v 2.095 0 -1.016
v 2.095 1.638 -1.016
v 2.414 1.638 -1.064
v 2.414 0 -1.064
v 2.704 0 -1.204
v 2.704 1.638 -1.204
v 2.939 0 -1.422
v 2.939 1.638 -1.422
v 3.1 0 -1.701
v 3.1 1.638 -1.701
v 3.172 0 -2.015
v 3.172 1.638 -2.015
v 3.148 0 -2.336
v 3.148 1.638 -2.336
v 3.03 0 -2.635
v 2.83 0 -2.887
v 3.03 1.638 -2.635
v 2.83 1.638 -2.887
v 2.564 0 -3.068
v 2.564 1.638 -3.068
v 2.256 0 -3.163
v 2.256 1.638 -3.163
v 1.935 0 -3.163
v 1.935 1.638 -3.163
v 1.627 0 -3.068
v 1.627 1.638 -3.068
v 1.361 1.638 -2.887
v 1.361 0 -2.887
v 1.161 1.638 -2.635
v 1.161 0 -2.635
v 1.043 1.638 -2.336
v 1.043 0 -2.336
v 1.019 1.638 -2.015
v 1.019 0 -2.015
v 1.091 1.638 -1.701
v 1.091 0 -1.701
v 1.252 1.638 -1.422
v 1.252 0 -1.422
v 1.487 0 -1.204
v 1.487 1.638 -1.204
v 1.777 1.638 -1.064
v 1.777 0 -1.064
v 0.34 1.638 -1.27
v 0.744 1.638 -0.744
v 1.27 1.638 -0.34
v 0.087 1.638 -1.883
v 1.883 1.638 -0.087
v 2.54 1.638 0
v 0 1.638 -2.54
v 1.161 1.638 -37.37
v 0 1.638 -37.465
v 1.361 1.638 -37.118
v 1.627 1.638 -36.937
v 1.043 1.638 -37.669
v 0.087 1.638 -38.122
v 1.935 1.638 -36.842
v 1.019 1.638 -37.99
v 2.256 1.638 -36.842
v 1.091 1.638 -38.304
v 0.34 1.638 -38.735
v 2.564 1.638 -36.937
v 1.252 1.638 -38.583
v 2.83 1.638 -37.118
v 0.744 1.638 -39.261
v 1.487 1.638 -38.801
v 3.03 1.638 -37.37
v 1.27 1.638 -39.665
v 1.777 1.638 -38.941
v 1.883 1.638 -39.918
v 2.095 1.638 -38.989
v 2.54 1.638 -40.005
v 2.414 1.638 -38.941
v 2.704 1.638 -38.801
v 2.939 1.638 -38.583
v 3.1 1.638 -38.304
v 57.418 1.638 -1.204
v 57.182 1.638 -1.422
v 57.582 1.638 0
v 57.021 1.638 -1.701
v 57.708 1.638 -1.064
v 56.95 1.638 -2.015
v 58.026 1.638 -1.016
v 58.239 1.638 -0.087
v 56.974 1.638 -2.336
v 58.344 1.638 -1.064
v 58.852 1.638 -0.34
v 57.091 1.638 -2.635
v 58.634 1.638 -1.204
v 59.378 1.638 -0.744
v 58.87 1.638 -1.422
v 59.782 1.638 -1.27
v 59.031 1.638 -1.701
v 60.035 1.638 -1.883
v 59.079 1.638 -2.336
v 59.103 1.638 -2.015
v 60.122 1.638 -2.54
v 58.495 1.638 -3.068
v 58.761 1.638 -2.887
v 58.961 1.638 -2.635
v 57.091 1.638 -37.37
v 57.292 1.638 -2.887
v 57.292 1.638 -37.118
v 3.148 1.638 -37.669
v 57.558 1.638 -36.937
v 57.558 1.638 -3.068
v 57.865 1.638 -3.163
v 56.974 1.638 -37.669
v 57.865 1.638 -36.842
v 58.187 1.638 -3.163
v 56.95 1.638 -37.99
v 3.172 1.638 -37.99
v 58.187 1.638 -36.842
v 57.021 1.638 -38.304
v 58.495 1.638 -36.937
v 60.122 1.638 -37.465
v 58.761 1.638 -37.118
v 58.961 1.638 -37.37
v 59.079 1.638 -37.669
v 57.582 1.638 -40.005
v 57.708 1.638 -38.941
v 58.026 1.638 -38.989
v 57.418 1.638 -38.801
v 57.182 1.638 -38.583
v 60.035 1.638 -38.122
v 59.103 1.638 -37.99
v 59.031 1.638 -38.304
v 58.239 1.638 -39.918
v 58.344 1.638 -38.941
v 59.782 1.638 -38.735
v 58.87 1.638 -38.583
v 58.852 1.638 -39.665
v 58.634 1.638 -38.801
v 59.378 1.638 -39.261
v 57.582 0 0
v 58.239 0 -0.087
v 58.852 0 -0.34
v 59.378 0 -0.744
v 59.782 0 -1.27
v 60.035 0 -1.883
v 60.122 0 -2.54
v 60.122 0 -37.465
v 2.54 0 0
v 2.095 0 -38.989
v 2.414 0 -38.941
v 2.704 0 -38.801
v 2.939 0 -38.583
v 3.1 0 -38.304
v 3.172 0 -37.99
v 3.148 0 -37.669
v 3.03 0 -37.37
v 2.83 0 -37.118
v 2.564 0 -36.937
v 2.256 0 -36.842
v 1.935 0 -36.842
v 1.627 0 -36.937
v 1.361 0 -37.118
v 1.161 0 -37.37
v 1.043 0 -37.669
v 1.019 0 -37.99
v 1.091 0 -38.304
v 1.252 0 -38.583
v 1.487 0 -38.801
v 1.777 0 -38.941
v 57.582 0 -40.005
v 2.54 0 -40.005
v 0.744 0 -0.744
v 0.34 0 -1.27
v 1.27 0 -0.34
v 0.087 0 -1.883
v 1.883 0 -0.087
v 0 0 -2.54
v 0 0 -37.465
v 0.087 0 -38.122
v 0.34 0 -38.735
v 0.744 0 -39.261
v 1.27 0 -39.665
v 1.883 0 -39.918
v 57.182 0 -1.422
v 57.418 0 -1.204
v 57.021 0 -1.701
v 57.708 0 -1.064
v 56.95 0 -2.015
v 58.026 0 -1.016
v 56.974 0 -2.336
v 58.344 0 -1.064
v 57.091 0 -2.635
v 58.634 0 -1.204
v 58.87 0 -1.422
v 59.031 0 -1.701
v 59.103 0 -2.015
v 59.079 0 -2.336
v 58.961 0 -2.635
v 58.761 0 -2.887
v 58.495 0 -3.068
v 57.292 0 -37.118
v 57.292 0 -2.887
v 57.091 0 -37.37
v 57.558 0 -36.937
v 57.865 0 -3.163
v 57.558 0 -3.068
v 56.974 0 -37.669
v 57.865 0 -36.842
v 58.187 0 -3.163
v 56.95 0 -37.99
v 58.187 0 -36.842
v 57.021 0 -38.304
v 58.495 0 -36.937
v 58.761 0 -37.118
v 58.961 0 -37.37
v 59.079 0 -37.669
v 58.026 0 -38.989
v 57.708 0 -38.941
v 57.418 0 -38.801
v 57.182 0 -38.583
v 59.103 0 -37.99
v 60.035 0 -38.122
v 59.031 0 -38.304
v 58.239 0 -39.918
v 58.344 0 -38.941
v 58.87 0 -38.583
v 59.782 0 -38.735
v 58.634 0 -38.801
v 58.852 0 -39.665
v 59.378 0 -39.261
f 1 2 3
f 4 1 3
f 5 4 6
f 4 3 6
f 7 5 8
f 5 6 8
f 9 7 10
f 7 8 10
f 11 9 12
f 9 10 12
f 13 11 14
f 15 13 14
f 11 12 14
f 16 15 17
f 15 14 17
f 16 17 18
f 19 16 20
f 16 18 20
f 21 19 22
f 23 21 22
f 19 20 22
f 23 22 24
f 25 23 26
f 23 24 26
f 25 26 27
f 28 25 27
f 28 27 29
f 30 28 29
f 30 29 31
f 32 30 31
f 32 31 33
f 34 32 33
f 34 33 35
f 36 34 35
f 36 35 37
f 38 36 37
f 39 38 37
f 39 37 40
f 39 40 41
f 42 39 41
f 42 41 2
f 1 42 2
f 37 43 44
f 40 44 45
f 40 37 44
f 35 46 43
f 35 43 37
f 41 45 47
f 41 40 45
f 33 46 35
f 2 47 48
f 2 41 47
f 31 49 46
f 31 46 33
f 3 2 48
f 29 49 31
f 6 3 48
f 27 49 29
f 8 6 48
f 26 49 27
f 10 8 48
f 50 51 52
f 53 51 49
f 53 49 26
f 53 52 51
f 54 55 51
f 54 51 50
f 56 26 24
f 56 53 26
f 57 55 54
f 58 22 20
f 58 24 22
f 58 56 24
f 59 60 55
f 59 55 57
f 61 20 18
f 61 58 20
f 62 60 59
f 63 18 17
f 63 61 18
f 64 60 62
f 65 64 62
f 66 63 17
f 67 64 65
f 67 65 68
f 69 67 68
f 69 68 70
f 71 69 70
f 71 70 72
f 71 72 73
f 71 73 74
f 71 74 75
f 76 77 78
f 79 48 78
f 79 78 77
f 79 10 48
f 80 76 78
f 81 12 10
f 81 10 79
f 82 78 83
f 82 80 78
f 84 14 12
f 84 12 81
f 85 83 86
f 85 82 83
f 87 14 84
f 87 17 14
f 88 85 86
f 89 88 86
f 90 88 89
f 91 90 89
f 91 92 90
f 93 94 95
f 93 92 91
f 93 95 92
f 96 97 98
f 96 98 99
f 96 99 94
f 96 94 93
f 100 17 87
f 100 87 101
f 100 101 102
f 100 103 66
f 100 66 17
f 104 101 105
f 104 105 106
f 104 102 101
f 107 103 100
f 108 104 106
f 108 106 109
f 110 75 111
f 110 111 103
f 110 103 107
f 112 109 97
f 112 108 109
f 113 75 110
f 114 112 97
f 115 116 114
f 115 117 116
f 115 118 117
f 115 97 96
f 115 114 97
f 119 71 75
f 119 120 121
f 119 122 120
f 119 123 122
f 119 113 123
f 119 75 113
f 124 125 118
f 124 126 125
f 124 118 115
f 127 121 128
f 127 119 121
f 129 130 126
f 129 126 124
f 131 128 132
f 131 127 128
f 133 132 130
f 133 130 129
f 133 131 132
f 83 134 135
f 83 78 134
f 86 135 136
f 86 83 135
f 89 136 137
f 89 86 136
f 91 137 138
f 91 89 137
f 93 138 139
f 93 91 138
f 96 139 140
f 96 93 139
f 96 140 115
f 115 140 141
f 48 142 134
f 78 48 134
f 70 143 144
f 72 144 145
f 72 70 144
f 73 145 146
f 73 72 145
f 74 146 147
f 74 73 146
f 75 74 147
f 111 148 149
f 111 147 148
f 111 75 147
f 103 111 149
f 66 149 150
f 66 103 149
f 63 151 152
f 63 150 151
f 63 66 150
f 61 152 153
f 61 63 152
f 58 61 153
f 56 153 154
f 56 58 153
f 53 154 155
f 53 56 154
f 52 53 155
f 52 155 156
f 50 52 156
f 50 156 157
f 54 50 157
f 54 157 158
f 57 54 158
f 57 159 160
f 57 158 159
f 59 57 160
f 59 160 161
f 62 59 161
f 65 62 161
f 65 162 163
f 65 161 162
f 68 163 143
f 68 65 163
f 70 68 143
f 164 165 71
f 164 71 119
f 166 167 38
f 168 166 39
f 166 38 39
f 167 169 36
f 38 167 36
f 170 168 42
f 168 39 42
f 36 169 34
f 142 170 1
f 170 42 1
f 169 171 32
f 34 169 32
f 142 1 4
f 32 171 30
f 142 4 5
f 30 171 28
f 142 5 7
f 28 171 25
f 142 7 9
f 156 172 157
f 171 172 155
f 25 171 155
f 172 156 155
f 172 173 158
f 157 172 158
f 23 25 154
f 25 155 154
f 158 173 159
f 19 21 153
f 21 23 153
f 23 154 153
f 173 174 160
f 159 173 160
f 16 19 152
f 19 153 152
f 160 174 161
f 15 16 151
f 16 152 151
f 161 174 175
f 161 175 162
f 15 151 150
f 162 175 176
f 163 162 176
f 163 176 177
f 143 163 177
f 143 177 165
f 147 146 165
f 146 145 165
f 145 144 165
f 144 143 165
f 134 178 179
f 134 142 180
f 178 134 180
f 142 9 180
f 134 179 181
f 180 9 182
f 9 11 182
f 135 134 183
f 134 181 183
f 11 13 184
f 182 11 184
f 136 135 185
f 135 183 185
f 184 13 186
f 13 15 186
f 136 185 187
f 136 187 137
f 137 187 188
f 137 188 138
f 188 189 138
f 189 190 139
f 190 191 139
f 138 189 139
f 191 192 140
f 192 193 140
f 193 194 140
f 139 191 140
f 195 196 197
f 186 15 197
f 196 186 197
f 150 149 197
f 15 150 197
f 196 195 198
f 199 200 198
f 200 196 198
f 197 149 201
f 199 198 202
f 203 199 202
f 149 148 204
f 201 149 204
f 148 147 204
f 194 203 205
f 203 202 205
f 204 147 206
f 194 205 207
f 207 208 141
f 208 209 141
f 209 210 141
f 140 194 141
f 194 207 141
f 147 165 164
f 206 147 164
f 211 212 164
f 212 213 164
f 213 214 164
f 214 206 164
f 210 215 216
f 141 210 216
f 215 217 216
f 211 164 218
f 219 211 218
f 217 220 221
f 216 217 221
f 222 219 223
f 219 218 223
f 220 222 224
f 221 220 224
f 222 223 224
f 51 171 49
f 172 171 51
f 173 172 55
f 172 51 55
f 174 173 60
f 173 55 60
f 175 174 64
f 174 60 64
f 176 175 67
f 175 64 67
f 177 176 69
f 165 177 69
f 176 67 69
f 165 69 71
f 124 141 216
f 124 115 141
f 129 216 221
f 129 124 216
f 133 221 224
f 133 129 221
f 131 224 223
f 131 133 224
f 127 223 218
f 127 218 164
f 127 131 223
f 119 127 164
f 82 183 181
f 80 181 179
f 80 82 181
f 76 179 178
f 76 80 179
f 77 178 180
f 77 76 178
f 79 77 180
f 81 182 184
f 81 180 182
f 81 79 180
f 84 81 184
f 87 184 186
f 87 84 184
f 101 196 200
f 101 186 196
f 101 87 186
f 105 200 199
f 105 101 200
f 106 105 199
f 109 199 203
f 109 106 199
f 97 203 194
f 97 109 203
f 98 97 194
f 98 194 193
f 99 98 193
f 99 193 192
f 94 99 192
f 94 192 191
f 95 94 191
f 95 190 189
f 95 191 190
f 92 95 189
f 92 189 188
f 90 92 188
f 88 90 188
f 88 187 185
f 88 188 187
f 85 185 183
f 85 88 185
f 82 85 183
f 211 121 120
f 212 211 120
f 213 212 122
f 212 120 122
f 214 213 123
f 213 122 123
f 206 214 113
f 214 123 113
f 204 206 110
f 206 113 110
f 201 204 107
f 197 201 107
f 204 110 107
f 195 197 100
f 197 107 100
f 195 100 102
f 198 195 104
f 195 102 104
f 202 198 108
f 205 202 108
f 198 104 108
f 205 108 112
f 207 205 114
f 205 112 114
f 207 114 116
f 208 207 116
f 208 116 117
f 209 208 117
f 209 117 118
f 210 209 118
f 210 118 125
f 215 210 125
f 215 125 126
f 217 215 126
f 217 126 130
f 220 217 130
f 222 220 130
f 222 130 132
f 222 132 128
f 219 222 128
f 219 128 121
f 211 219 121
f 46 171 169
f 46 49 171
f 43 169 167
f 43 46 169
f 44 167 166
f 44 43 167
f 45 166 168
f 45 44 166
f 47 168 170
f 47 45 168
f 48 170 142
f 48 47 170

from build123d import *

# Parameters (mm, degrees)
SKETCH1_W               = 60.1218
SKETCH1_H               = 40.005
BOSS_EXTRUDE1_DEPTH     = 1.6383
FILLET1_R               = 2.54
SKETCH3_R               = 1.0795
CUT_EXTRUDE2_DEPTH      = 73.233751717
MIRROR2_COPY_1_SKETCH_R = 1.0795
MIRROR2_COPY_1_DEPTH    = 73.233751717


with BuildPart() as part:
    # Sketch1 → Boss-Extrude1 (new body)
    with BuildSketch(Plane(origin=(0, 0, 0), x_dir=(1, 0, 0), z_dir=(0, 1, 0))):
        with Locations((30.0609, 20.0025)):
            Rectangle(SKETCH1_W, SKETCH1_H)
    extrude(amount=BOSS_EXTRUDE1_DEPTH)

    # Fillet1
    fillet1_edges = [part.edges().sort_by_distance(p)[0] for p in [
        (0, 0.81915, -40.005),
        (60.1218, 0.81915, -40.005),
        (60.1218, 0.81915, 0),
        (0, 0.81915, 0),
    ]]
    fillet(fillet1_edges, radius=FILLET1_R)

    # Sketch3 → Cut-Extrude2 (cut, through all)
    with BuildSketch(Plane(origin=(0, 1.6383, 0), x_dir=(1, 0, 0), z_dir=(0, 1, 0))):
        with Locations(Location((2.0955, 2.0955, 0), (0, 0, 270))):
            Circle(SKETCH3_R)
    cut_extrude2 = extrude(amount=-CUT_EXTRUDE2_DEPTH, mode=Mode.SUBTRACT)

    # Mirror1: Cut-Extrude2 across plane
    add(cut_extrude2.mirror(Plane.XY.offset(-20.0025)), mode=Mode.SUBTRACT)

    # Mirror2: Cut-Extrude2 across plane
    add(cut_extrude2.mirror(Plane(origin=(30.0609, 0, 0), x_dir=(0, 0, 1), z_dir=(1, 0, 0))), mode=Mode.SUBTRACT)

    # Mirror2 copy 1 sketch → Mirror2 copy 1 (cut, through all)
    with BuildSketch(Plane(origin=(60.1218, 1.6383, -40.005), x_dir=(-1, 0, 0), z_dir=(0, 1, 0))):
        with Locations(Location((2.0955, 2.0955, 0), (0, 0, 270))):
            Circle(MIRROR2_COPY_1_SKETCH_R)
    extrude(amount=-MIRROR2_COPY_1_DEPTH, mode=Mode.SUBTRACT)


solid = part.part
